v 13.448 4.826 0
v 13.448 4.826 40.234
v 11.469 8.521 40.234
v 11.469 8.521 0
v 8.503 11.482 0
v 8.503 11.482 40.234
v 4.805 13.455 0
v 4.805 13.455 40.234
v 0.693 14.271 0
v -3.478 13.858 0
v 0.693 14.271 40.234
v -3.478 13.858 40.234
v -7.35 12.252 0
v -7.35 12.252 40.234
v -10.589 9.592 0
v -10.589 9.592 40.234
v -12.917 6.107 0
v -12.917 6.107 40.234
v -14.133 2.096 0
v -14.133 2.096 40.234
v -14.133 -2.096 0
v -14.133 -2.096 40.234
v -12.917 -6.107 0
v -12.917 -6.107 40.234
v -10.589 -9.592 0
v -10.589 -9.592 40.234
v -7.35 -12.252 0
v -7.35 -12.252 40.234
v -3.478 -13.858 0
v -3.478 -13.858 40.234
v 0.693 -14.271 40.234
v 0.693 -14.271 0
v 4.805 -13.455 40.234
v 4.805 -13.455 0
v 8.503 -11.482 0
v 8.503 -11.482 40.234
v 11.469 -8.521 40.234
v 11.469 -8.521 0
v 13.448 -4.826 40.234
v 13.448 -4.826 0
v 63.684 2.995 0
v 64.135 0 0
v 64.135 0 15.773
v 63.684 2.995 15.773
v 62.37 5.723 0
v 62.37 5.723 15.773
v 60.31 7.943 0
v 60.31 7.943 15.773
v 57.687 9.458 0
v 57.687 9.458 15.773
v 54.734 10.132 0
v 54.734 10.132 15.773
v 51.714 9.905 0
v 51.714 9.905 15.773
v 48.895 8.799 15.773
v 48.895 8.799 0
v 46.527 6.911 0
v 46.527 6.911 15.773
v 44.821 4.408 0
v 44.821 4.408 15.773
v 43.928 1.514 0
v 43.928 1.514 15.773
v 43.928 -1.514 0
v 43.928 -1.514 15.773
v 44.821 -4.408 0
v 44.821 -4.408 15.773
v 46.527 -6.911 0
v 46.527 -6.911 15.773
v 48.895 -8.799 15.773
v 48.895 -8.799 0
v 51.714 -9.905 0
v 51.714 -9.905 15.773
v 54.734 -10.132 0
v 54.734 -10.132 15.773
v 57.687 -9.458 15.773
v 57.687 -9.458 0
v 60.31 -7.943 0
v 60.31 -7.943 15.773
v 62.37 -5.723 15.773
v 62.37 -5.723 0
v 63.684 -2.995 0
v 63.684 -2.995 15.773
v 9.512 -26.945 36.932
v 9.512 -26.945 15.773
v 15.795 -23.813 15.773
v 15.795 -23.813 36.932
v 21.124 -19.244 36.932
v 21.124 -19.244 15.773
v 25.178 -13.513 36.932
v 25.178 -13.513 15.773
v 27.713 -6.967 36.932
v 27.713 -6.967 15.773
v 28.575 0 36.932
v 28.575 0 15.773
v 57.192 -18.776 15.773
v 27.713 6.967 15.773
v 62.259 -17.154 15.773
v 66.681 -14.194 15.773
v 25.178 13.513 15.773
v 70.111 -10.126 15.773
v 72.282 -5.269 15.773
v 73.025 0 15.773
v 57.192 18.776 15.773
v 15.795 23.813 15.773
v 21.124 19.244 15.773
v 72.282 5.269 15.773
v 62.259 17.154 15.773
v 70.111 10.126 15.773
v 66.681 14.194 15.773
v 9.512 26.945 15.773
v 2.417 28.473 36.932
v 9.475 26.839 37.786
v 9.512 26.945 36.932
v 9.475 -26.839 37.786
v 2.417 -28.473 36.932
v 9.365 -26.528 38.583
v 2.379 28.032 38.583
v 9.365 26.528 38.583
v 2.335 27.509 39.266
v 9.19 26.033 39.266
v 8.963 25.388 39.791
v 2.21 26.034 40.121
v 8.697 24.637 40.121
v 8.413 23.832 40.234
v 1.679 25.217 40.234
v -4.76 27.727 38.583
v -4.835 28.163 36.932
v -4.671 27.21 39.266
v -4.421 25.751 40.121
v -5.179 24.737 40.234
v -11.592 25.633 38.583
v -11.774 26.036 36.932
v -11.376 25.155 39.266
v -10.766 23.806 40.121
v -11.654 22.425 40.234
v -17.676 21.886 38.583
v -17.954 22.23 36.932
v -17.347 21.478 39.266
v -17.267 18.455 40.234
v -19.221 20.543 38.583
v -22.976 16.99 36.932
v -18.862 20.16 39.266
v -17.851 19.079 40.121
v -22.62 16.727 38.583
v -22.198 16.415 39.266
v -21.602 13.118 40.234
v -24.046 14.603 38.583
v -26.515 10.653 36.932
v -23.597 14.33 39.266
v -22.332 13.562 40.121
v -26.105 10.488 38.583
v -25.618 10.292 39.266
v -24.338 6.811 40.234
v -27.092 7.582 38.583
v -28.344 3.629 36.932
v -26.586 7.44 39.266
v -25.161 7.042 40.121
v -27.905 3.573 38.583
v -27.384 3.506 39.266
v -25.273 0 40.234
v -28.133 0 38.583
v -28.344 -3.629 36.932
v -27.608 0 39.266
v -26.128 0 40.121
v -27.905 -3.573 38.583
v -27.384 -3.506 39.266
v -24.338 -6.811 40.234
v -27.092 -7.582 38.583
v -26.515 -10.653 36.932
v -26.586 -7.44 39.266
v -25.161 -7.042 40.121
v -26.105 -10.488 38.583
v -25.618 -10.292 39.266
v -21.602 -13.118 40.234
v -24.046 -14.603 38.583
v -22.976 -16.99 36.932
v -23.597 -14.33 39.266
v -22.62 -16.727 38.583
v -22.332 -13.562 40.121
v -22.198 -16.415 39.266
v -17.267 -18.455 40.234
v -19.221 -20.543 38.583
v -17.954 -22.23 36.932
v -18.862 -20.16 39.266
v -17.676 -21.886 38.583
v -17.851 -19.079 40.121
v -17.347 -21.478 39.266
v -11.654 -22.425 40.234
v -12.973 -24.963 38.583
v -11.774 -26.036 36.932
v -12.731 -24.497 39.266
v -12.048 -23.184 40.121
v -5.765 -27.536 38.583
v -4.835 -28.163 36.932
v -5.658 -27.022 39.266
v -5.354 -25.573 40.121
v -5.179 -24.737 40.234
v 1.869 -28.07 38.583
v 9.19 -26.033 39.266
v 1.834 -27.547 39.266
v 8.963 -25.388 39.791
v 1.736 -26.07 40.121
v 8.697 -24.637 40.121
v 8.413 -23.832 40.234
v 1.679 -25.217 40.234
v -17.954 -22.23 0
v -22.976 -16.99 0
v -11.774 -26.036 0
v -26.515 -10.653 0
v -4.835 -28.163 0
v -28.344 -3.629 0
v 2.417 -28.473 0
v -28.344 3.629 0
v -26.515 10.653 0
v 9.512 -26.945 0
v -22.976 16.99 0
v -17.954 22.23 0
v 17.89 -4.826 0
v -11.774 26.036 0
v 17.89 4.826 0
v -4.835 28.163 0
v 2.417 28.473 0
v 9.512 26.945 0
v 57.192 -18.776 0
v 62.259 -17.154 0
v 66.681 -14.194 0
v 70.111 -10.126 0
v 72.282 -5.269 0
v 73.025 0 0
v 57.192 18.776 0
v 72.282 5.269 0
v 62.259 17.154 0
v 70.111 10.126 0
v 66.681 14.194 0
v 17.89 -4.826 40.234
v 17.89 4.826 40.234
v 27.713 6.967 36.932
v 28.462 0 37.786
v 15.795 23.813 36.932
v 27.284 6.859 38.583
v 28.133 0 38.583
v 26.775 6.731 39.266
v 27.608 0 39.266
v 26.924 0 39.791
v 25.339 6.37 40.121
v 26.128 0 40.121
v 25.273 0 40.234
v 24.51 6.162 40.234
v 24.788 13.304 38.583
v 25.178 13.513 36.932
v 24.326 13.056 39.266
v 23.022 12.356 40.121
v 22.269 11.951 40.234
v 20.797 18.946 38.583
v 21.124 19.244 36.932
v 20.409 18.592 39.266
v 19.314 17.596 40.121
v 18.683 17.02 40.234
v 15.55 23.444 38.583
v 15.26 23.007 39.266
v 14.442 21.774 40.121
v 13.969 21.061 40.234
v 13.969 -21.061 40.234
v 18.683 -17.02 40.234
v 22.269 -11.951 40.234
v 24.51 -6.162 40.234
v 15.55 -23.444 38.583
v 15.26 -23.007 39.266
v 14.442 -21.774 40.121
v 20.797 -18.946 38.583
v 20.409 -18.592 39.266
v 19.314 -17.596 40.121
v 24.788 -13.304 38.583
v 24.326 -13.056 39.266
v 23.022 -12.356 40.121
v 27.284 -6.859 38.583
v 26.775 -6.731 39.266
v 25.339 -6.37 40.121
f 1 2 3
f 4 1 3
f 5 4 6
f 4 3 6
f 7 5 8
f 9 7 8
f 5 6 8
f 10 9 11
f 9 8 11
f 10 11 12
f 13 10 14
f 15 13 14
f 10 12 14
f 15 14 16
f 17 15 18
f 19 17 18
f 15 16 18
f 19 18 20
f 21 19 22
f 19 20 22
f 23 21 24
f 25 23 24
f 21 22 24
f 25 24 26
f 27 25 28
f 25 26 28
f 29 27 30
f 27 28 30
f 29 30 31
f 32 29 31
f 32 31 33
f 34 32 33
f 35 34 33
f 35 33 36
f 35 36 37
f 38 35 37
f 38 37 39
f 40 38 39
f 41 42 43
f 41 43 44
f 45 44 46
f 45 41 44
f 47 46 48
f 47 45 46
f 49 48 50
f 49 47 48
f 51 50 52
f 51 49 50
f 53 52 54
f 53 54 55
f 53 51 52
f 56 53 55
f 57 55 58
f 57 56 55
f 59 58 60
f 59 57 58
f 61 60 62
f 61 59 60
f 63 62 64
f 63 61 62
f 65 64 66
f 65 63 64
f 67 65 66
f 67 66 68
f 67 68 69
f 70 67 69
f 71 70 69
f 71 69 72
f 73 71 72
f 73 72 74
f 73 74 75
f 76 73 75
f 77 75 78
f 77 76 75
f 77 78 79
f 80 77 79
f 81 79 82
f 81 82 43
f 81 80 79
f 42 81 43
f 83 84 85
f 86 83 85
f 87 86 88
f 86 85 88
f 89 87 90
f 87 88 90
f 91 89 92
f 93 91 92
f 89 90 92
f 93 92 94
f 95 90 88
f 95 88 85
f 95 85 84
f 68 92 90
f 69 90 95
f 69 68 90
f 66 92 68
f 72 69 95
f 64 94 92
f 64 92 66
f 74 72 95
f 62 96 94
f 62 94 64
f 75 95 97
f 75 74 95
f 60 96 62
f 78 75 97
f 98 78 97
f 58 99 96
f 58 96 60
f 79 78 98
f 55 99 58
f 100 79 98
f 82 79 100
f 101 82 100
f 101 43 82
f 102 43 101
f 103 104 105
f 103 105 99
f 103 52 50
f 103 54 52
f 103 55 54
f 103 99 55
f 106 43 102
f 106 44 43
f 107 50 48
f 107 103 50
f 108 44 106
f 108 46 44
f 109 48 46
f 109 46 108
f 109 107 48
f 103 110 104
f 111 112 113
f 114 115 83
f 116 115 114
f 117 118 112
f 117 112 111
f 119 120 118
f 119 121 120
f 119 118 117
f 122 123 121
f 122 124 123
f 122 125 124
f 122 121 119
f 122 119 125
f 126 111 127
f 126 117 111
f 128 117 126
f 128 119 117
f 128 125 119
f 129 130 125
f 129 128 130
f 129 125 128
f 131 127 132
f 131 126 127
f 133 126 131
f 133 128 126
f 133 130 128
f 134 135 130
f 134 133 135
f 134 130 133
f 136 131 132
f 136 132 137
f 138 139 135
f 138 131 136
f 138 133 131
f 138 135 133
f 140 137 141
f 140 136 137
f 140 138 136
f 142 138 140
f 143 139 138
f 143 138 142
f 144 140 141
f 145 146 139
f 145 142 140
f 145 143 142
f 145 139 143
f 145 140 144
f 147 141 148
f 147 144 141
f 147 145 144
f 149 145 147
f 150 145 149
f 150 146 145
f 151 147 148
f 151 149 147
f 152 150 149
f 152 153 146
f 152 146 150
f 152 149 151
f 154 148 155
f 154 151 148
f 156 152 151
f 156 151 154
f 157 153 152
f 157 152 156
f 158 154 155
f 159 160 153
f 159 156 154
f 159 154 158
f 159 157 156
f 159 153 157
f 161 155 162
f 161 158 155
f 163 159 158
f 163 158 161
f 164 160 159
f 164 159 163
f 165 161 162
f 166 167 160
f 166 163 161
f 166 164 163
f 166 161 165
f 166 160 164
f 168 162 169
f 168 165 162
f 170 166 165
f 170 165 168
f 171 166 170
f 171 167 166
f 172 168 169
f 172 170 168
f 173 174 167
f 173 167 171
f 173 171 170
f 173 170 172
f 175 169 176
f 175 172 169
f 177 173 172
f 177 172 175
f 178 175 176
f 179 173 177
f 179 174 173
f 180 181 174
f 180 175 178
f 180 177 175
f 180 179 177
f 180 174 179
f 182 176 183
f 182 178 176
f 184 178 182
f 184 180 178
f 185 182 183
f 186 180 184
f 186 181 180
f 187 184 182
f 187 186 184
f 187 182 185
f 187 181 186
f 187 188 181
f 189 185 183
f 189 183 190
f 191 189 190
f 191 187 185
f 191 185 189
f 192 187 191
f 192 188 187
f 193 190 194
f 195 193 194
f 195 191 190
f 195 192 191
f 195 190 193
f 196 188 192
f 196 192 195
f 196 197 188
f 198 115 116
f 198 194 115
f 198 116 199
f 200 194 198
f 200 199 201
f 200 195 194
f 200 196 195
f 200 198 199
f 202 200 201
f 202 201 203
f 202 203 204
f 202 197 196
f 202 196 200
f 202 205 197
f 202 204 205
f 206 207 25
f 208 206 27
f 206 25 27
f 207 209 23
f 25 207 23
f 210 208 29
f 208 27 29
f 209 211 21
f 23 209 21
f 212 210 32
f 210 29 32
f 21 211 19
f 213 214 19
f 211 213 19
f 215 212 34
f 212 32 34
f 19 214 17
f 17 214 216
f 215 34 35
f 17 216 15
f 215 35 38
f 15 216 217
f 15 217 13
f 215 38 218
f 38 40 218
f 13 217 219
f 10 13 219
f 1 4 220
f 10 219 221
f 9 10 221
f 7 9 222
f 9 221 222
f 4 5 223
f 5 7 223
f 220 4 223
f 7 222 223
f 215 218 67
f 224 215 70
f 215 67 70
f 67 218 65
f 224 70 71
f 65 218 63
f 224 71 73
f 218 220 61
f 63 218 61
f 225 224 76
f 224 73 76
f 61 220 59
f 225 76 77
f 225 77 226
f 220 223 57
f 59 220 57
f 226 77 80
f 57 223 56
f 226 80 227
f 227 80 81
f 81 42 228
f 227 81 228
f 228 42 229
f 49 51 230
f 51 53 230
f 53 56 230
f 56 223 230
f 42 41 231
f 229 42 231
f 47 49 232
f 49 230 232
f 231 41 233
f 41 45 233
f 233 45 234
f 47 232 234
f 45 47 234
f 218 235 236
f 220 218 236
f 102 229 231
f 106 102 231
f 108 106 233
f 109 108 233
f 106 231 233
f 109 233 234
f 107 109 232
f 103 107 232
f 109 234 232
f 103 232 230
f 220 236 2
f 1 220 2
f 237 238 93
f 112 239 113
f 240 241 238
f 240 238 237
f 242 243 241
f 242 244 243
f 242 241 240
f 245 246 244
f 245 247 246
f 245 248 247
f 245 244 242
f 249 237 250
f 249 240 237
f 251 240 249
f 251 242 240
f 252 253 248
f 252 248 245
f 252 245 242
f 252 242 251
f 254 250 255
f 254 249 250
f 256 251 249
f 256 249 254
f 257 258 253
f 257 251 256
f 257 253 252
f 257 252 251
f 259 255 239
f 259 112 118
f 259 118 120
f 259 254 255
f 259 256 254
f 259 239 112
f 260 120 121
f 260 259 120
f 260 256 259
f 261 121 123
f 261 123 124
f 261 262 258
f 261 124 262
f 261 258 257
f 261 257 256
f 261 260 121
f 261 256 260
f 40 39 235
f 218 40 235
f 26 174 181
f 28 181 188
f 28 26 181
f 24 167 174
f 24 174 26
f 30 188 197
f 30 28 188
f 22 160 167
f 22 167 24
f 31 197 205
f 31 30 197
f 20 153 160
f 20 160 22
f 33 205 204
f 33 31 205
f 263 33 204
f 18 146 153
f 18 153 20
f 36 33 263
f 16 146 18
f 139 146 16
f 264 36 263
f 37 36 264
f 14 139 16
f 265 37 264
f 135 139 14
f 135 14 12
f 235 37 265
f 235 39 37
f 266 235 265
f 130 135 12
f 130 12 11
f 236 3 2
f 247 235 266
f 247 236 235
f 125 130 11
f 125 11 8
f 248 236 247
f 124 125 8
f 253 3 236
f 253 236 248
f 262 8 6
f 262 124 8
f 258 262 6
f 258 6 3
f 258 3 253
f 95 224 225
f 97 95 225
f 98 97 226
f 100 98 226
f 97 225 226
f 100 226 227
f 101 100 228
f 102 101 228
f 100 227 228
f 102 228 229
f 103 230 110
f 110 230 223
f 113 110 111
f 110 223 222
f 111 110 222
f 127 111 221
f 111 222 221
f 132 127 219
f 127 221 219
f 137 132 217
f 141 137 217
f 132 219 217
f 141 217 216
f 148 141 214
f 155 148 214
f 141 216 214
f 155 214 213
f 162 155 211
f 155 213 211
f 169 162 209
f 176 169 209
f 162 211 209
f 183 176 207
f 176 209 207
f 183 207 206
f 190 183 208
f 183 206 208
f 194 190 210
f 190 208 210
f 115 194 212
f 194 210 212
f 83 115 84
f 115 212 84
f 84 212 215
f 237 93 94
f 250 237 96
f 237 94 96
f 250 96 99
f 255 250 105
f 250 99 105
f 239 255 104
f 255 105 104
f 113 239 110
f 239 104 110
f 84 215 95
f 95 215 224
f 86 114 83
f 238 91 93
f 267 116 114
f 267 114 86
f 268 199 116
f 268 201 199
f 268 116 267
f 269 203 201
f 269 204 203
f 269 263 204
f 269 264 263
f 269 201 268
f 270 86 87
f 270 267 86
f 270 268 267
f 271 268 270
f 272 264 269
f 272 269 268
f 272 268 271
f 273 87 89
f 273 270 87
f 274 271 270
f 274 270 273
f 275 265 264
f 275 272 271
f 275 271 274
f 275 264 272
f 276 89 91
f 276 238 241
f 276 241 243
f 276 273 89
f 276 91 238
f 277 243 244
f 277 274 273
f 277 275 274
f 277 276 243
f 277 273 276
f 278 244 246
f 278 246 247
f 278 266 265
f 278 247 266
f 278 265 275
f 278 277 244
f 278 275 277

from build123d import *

# Parameters (mm, degrees)
F1_DEPTH = 40.2336
F2_R     = 10.16
F3_DEPTH = 15.7734
F5_DEPTH = 40.2346
F6_R     = 3.302


with BuildPart() as f1:
    # F0 (on Top) → F1 (new body)
    with BuildSketch(Plane.XY):
        with BuildLine():
            ThreePointArc((9.512184, -26.945296), (23.327466, -16.503332), (28.575, 0))
            ThreePointArc((28.575, 0), (23.327466, 16.503332), (9.512184, 26.945296))
            ThreePointArc((9.512184, 26.945296), (-28.575, 0), (9.512184, -26.945296))
        make_face()
    extrude(amount=F1_DEPTH)

    # F2 (on Top) + F0 (on Top) → F3 (join)
    with BuildSketch(Plane.XY):
        with BuildLine():
            ThreePointArc((57.191927, -18.776418), (68.538395, -12.280473), (73.025, 0))
            ThreePointArc((73.025, 0), (68.538395, 12.280473), (57.191927, 18.776418))
            ThreePointArc((57.191927, 18.776418), (34.925, 0), (57.191927, -18.776418))
        make_face()
        with Locations((53.975, 0)):
            Circle(F2_R, mode=Mode.SUBTRACT)
    with BuildSketch(Plane.XY):
        with BuildLine():
            ThreePointArc((9.512184, 26.945296), (23.327466, 16.503332), (28.575, 0))
            ThreePointArc((28.575, 0), (23.327466, -16.503332), (9.512184, -26.945296))
            Line((9.512184, -26.945296), (57.191927, -18.776418))
            ThreePointArc((57.191927, -18.776418), (34.925, 0), (57.191927, 18.776418))
            Line((57.191927, 18.776418), (9.512184, 26.945296))
        make_face()
    extrude(amount=F3_DEPTH)

    # F4 (on face) → F5 (cut, through all)
    with BuildSketch(Plane.XY.offset(40.2336)):
        with BuildLine():
            Line((17.889793, 4.826), (13.447765, 4.826))
            ThreePointArc((13.447765, 4.826), (-14.2875, 0), (13.447765, -4.826))
            Line((13.447765, -4.826), (17.889793, -4.826))
            Line((17.889793, -4.826), (17.889793, 4.826))
        make_face()
    extrude(amount=-F5_DEPTH, mode=Mode.SUBTRACT)

    # F6
    f6_edges = [f1.edges().sort_by_distance(p)[0] for p in [
        (-9.512184, 26.945296, 40.2336),
    ]]
    fillet(f6_edges, radius=F6_R)


solid = f1.part
